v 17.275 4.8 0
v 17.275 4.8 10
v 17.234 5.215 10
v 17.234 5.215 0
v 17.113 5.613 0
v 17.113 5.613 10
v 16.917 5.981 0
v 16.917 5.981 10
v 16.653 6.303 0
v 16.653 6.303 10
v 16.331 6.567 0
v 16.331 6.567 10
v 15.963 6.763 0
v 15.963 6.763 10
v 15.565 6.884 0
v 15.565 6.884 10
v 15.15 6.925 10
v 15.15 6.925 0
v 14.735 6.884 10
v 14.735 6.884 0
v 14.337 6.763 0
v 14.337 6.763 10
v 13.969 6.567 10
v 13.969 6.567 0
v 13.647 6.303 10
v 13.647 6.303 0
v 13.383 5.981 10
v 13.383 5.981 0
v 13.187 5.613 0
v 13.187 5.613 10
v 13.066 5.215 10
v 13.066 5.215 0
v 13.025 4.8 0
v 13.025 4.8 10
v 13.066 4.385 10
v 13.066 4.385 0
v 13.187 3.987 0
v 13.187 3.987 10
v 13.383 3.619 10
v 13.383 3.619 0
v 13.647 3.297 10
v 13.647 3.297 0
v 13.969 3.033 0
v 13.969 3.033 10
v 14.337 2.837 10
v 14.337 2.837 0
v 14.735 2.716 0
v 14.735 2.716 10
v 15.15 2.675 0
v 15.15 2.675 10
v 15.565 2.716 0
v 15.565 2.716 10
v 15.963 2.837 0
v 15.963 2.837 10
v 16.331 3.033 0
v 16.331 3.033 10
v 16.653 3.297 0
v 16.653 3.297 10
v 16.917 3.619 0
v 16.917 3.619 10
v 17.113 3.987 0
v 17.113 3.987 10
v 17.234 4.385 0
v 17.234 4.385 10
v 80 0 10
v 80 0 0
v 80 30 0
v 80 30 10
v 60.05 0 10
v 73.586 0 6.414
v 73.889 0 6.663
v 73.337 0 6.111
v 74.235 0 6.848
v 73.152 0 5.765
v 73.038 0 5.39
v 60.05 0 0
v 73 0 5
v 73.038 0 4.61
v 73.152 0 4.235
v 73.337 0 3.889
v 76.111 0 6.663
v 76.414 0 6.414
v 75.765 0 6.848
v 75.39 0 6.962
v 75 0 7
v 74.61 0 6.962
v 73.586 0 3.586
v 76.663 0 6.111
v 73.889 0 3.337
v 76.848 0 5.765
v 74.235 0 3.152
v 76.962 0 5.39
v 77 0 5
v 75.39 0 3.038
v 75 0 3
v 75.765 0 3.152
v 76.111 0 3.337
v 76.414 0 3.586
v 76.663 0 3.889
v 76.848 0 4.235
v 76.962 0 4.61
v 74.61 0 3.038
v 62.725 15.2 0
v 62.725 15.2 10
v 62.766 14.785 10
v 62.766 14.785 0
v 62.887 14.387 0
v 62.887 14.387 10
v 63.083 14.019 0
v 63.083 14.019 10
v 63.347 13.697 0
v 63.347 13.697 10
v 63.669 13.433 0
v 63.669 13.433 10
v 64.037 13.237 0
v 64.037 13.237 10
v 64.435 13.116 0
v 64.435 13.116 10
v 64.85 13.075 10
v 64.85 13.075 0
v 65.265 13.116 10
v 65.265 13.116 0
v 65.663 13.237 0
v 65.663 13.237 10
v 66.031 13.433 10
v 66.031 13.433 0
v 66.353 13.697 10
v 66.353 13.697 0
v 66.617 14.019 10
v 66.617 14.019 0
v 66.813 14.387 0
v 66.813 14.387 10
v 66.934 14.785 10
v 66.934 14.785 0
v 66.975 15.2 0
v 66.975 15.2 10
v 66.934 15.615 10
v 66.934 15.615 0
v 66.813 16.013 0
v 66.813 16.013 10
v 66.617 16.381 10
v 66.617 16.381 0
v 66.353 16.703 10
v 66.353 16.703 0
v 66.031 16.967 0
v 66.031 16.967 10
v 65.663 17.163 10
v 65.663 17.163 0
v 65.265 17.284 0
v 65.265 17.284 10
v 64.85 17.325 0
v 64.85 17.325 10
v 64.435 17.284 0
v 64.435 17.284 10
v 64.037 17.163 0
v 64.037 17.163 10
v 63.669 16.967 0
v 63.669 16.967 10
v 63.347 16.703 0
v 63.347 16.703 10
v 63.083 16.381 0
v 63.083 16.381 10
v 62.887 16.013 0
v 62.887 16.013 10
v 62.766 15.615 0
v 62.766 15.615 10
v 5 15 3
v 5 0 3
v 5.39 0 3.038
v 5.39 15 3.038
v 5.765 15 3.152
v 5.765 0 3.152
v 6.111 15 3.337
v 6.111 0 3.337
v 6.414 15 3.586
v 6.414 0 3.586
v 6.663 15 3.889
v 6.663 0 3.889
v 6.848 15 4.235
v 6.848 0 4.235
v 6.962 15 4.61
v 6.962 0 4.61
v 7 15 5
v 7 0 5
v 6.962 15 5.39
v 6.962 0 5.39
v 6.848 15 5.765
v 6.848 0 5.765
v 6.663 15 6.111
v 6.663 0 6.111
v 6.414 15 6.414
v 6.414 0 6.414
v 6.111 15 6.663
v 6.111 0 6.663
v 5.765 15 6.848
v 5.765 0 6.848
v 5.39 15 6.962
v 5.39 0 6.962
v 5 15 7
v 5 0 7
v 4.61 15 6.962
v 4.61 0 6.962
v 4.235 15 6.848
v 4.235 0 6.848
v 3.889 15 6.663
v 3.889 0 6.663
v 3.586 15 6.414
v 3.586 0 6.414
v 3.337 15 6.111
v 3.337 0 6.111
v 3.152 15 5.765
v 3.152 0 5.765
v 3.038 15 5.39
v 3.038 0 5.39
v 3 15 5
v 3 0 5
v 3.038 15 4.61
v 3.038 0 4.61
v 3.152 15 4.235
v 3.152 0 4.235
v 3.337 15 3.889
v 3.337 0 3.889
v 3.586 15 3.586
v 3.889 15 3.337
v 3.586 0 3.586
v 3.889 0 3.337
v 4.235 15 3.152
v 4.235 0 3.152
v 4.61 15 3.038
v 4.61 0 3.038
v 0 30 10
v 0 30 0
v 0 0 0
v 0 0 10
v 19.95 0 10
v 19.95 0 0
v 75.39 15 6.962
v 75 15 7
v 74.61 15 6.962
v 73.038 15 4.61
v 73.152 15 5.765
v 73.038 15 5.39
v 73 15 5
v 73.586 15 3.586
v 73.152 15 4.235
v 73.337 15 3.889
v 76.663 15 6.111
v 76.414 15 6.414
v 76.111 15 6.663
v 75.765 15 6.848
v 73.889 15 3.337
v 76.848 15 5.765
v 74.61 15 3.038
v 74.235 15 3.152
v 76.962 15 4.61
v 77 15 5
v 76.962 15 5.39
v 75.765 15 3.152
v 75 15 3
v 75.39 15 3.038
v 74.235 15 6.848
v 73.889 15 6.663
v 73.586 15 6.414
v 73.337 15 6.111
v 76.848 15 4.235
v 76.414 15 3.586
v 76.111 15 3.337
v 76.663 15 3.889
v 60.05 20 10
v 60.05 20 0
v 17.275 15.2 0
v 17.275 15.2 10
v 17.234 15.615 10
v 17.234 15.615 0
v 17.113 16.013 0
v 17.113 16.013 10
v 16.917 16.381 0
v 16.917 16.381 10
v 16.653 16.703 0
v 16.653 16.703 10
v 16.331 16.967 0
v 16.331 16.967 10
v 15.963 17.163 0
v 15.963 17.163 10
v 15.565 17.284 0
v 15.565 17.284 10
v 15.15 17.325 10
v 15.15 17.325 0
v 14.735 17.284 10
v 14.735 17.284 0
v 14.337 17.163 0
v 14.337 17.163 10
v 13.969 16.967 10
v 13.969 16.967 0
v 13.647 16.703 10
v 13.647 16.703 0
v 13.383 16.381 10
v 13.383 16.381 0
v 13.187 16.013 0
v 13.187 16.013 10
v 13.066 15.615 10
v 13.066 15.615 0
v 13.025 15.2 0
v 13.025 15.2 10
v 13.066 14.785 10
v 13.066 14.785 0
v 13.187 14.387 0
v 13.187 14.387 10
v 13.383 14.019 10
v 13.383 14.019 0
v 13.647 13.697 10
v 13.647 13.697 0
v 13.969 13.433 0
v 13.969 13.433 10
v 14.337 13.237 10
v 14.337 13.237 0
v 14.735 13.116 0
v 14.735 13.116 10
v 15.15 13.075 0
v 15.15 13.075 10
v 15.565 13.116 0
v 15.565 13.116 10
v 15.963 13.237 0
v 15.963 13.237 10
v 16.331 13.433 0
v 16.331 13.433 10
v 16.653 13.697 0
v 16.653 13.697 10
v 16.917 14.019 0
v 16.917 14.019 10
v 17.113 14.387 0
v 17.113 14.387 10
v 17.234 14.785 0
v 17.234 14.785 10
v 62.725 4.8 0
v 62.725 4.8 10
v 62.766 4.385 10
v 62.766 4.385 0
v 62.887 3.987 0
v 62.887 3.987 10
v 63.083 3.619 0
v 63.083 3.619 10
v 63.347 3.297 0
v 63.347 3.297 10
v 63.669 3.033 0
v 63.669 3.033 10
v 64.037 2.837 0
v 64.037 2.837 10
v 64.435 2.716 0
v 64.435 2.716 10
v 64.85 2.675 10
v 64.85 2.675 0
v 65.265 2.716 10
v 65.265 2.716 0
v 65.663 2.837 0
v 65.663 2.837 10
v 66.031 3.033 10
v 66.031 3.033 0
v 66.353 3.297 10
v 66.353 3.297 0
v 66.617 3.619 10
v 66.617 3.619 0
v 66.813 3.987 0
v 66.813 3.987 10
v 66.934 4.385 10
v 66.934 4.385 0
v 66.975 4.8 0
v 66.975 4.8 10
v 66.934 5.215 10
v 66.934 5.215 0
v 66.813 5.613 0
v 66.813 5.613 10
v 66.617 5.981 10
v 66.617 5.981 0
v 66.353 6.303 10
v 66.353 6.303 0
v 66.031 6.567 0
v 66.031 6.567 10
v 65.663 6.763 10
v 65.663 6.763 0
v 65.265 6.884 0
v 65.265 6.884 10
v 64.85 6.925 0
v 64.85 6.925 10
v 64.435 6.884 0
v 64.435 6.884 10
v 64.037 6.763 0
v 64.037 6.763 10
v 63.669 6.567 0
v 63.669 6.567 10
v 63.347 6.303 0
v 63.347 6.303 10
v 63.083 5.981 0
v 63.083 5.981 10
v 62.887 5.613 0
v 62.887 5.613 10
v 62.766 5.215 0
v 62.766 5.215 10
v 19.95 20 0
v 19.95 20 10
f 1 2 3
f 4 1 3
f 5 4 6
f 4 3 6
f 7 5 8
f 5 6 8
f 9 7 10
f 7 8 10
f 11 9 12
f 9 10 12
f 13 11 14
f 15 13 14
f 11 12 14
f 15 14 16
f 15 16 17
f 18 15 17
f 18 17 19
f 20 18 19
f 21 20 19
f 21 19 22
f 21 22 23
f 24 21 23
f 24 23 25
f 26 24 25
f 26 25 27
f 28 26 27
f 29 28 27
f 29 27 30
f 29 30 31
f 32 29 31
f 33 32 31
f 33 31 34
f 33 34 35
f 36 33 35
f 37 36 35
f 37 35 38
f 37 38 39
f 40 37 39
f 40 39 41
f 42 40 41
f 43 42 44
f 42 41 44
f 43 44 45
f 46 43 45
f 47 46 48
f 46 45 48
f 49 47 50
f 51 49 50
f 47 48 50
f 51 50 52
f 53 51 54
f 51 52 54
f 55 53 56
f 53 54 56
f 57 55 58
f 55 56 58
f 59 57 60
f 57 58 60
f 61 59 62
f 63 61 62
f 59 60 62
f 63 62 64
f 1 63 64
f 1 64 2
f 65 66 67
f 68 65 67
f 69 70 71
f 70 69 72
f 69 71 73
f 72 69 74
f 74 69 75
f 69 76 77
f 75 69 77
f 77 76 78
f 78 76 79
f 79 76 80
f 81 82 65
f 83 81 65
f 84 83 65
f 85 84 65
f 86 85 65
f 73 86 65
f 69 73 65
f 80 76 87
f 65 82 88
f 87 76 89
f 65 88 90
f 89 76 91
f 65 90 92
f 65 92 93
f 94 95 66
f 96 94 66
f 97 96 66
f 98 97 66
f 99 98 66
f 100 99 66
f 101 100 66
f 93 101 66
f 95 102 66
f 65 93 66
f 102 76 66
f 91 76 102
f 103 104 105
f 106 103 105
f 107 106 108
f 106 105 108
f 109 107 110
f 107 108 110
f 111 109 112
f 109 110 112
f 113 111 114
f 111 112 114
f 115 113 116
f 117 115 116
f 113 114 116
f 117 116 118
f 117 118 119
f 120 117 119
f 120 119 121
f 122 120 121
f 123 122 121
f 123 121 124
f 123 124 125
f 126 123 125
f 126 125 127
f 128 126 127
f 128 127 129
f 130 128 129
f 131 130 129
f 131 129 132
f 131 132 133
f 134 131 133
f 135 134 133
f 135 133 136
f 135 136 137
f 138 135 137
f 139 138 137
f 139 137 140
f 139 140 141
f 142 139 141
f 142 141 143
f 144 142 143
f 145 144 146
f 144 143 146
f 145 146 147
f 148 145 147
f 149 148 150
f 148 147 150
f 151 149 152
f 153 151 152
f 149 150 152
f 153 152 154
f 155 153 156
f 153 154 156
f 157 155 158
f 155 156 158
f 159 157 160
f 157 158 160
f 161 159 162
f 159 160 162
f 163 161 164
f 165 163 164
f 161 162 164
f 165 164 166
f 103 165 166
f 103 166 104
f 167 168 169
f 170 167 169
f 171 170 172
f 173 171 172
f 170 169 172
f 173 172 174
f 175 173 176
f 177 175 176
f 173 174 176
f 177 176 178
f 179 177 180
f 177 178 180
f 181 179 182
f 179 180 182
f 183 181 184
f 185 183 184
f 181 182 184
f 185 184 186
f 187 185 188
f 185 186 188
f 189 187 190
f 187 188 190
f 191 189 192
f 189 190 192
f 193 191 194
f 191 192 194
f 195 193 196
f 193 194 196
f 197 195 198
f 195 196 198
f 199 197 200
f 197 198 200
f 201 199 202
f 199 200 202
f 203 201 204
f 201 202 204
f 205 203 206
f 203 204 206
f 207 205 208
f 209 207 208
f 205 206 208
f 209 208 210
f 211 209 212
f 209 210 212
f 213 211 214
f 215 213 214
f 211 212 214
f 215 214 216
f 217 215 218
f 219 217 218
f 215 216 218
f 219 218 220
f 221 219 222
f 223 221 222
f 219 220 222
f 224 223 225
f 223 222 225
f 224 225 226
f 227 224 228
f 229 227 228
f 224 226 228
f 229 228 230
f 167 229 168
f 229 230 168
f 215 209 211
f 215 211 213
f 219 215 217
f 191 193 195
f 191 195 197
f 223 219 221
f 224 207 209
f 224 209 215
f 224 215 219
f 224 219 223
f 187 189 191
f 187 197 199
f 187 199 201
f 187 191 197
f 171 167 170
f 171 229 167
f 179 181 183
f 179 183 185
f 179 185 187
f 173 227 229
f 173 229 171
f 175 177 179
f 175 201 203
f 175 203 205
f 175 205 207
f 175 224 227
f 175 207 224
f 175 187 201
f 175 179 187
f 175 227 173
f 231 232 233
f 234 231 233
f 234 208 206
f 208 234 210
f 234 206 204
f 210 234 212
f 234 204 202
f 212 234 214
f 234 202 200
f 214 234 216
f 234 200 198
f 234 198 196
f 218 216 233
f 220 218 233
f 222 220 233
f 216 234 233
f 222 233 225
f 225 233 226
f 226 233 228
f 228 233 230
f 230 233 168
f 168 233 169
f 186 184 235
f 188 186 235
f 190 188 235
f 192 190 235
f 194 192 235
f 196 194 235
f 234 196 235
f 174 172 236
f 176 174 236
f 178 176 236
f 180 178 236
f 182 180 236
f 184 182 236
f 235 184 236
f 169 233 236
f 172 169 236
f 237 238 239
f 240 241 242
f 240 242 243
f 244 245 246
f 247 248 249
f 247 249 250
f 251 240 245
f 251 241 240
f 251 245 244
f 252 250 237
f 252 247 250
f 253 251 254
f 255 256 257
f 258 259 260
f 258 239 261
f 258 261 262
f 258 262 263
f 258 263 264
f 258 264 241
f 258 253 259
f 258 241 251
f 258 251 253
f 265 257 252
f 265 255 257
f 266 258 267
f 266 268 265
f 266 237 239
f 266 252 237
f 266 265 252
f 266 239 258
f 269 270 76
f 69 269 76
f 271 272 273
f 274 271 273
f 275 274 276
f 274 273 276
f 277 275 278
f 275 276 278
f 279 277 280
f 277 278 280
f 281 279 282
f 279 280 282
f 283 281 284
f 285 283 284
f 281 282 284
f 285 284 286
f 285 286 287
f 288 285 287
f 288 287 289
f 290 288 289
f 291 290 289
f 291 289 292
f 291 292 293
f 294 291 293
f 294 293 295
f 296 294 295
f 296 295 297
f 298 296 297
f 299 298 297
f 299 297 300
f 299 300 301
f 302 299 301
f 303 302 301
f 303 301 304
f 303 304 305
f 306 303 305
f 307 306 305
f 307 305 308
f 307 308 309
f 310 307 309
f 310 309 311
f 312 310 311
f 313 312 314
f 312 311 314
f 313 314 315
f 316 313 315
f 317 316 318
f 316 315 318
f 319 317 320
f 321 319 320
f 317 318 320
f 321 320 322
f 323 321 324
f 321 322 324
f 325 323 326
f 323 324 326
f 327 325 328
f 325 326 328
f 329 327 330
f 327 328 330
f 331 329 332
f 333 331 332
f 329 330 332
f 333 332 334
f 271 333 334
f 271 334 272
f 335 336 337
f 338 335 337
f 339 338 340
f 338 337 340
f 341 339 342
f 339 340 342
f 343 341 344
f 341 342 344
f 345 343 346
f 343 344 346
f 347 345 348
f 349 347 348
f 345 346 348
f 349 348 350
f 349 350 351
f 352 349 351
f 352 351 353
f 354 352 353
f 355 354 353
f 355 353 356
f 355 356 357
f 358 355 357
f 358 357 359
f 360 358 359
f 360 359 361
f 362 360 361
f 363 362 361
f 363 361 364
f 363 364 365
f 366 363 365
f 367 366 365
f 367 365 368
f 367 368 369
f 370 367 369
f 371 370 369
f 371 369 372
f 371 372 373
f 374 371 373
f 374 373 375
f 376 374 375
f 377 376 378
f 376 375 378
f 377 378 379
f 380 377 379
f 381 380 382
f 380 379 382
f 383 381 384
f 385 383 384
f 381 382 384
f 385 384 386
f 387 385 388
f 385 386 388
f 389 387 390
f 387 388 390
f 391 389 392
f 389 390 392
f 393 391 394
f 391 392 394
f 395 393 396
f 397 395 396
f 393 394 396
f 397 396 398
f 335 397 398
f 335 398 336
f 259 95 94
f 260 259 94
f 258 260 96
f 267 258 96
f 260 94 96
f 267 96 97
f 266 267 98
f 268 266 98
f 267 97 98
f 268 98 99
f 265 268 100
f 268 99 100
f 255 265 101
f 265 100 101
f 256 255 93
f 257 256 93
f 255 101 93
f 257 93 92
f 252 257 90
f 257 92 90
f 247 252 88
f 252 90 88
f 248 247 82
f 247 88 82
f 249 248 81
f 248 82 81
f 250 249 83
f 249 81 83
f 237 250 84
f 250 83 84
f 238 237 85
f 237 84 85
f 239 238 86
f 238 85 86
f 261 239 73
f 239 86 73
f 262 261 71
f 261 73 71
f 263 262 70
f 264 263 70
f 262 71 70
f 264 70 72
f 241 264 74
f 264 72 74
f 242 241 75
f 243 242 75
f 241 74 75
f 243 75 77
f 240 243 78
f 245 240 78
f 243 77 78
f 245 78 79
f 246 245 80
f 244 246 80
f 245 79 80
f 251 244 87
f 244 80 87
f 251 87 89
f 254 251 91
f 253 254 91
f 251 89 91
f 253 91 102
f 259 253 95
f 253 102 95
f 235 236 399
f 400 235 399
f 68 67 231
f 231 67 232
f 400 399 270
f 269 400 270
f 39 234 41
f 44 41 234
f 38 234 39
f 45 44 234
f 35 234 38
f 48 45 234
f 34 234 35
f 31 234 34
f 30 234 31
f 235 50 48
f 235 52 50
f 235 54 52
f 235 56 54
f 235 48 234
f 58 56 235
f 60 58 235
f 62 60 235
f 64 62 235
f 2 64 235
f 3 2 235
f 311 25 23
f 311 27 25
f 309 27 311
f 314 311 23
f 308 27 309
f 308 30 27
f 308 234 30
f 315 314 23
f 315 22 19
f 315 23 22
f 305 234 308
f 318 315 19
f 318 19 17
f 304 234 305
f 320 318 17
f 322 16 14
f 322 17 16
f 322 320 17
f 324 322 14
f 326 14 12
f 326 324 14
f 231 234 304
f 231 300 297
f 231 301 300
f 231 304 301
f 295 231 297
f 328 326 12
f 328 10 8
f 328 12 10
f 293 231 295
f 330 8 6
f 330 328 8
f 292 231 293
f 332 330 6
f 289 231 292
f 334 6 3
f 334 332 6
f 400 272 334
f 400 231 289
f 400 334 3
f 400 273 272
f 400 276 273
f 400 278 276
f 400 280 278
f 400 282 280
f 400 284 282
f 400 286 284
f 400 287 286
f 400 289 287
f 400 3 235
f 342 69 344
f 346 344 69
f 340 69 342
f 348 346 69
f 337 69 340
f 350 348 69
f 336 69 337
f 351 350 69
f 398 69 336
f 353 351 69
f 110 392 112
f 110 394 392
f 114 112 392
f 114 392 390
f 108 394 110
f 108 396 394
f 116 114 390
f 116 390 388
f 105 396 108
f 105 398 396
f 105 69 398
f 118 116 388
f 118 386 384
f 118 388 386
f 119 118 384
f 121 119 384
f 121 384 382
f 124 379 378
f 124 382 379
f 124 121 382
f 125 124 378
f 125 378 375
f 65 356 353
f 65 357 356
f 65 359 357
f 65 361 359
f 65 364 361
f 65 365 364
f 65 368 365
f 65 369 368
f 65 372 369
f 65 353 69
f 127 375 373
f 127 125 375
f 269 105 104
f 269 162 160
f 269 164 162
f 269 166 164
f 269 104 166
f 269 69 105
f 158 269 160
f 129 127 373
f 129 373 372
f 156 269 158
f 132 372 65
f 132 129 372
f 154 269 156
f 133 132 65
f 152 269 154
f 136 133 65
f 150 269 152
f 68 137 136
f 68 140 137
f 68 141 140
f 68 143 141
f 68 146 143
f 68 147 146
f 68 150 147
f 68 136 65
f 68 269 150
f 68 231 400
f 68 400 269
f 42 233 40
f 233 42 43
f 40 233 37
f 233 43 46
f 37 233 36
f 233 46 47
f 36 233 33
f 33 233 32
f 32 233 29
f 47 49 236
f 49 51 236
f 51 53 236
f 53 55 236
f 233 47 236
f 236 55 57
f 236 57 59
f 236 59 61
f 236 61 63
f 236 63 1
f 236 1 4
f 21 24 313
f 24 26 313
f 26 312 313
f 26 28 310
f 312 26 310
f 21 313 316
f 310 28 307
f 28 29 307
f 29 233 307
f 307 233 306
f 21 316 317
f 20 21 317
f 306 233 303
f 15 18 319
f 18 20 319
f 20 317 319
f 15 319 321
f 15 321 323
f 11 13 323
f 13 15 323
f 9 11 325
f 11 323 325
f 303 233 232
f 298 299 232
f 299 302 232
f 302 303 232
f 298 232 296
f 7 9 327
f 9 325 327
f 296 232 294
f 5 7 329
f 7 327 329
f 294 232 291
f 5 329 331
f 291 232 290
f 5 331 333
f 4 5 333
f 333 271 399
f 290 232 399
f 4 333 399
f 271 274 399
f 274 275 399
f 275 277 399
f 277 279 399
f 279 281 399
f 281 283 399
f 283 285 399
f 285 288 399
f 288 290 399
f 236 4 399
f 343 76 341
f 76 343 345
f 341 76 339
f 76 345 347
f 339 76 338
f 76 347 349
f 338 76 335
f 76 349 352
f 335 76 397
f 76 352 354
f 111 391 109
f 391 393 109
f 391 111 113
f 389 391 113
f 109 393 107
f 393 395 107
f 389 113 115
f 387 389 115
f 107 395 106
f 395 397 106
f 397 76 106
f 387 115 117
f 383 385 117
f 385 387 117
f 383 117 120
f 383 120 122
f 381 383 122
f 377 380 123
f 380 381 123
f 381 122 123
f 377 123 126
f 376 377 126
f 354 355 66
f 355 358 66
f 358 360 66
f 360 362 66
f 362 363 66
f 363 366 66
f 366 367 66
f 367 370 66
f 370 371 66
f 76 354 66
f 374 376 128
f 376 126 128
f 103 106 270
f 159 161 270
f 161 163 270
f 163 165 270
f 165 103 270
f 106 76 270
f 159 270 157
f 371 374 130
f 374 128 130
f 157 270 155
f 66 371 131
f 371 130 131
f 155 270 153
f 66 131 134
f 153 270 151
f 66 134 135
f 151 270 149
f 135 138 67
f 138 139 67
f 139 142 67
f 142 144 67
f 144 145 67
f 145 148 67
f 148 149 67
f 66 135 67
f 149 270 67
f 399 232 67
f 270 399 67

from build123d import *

# Parameters (mm, degrees)
BOSS_EXTRUDE1_DEPTH = 10
SKETCH2_R           = 2
CUT_EXTRUDE1_DEPTH  = 15
SKETCH3_R           = 2.125
CUT_EXTRUDE2_DEPTH  = 87.02325267


with BuildPart() as part:
    # Sketch1 → Boss-Extrude1 (new body)
    with BuildSketch(Plane.XY):
        Polygon((0, 0), (19.95, 0), (19.95, 20), (60.05, 20), (60.05, 0), (80, 0), (80, 30), (0, 30), align=None)
    extrude(amount=BOSS_EXTRUDE1_DEPTH)

    # Sketch2 → Cut-Extrude1 (cut)
    with BuildSketch(Plane.XZ):
        with Locations(Location((5, 5, 0), (0, 0, 270))):
            Circle(SKETCH2_R)
        with Locations(Location((75, 5, 0), (0, 0, 270))):
            Circle(SKETCH2_R)
    extrude(amount=-CUT_EXTRUDE1_DEPTH, mode=Mode.SUBTRACT)

    # Sketch3 → Cut-Extrude2 (cut, through all)
    with BuildSketch(Plane.XY.offset(10)):
        with Locations((15.15, 4.8)):
            Circle(SKETCH3_R)
        with Locations((15.15, 15.2)):
            Circle(SKETCH3_R)
        with Locations(Location((64.85, 15.2, 0), (0, 0, 180))):
            Circle(SKETCH3_R)
        with Locations(Location((64.85, 4.8, 0), (0, 0, 180))):
            Circle(SKETCH3_R)
    extrude(amount=-CUT_EXTRUDE2_DEPTH, mode=Mode.SUBTRACT)


solid = part.part
